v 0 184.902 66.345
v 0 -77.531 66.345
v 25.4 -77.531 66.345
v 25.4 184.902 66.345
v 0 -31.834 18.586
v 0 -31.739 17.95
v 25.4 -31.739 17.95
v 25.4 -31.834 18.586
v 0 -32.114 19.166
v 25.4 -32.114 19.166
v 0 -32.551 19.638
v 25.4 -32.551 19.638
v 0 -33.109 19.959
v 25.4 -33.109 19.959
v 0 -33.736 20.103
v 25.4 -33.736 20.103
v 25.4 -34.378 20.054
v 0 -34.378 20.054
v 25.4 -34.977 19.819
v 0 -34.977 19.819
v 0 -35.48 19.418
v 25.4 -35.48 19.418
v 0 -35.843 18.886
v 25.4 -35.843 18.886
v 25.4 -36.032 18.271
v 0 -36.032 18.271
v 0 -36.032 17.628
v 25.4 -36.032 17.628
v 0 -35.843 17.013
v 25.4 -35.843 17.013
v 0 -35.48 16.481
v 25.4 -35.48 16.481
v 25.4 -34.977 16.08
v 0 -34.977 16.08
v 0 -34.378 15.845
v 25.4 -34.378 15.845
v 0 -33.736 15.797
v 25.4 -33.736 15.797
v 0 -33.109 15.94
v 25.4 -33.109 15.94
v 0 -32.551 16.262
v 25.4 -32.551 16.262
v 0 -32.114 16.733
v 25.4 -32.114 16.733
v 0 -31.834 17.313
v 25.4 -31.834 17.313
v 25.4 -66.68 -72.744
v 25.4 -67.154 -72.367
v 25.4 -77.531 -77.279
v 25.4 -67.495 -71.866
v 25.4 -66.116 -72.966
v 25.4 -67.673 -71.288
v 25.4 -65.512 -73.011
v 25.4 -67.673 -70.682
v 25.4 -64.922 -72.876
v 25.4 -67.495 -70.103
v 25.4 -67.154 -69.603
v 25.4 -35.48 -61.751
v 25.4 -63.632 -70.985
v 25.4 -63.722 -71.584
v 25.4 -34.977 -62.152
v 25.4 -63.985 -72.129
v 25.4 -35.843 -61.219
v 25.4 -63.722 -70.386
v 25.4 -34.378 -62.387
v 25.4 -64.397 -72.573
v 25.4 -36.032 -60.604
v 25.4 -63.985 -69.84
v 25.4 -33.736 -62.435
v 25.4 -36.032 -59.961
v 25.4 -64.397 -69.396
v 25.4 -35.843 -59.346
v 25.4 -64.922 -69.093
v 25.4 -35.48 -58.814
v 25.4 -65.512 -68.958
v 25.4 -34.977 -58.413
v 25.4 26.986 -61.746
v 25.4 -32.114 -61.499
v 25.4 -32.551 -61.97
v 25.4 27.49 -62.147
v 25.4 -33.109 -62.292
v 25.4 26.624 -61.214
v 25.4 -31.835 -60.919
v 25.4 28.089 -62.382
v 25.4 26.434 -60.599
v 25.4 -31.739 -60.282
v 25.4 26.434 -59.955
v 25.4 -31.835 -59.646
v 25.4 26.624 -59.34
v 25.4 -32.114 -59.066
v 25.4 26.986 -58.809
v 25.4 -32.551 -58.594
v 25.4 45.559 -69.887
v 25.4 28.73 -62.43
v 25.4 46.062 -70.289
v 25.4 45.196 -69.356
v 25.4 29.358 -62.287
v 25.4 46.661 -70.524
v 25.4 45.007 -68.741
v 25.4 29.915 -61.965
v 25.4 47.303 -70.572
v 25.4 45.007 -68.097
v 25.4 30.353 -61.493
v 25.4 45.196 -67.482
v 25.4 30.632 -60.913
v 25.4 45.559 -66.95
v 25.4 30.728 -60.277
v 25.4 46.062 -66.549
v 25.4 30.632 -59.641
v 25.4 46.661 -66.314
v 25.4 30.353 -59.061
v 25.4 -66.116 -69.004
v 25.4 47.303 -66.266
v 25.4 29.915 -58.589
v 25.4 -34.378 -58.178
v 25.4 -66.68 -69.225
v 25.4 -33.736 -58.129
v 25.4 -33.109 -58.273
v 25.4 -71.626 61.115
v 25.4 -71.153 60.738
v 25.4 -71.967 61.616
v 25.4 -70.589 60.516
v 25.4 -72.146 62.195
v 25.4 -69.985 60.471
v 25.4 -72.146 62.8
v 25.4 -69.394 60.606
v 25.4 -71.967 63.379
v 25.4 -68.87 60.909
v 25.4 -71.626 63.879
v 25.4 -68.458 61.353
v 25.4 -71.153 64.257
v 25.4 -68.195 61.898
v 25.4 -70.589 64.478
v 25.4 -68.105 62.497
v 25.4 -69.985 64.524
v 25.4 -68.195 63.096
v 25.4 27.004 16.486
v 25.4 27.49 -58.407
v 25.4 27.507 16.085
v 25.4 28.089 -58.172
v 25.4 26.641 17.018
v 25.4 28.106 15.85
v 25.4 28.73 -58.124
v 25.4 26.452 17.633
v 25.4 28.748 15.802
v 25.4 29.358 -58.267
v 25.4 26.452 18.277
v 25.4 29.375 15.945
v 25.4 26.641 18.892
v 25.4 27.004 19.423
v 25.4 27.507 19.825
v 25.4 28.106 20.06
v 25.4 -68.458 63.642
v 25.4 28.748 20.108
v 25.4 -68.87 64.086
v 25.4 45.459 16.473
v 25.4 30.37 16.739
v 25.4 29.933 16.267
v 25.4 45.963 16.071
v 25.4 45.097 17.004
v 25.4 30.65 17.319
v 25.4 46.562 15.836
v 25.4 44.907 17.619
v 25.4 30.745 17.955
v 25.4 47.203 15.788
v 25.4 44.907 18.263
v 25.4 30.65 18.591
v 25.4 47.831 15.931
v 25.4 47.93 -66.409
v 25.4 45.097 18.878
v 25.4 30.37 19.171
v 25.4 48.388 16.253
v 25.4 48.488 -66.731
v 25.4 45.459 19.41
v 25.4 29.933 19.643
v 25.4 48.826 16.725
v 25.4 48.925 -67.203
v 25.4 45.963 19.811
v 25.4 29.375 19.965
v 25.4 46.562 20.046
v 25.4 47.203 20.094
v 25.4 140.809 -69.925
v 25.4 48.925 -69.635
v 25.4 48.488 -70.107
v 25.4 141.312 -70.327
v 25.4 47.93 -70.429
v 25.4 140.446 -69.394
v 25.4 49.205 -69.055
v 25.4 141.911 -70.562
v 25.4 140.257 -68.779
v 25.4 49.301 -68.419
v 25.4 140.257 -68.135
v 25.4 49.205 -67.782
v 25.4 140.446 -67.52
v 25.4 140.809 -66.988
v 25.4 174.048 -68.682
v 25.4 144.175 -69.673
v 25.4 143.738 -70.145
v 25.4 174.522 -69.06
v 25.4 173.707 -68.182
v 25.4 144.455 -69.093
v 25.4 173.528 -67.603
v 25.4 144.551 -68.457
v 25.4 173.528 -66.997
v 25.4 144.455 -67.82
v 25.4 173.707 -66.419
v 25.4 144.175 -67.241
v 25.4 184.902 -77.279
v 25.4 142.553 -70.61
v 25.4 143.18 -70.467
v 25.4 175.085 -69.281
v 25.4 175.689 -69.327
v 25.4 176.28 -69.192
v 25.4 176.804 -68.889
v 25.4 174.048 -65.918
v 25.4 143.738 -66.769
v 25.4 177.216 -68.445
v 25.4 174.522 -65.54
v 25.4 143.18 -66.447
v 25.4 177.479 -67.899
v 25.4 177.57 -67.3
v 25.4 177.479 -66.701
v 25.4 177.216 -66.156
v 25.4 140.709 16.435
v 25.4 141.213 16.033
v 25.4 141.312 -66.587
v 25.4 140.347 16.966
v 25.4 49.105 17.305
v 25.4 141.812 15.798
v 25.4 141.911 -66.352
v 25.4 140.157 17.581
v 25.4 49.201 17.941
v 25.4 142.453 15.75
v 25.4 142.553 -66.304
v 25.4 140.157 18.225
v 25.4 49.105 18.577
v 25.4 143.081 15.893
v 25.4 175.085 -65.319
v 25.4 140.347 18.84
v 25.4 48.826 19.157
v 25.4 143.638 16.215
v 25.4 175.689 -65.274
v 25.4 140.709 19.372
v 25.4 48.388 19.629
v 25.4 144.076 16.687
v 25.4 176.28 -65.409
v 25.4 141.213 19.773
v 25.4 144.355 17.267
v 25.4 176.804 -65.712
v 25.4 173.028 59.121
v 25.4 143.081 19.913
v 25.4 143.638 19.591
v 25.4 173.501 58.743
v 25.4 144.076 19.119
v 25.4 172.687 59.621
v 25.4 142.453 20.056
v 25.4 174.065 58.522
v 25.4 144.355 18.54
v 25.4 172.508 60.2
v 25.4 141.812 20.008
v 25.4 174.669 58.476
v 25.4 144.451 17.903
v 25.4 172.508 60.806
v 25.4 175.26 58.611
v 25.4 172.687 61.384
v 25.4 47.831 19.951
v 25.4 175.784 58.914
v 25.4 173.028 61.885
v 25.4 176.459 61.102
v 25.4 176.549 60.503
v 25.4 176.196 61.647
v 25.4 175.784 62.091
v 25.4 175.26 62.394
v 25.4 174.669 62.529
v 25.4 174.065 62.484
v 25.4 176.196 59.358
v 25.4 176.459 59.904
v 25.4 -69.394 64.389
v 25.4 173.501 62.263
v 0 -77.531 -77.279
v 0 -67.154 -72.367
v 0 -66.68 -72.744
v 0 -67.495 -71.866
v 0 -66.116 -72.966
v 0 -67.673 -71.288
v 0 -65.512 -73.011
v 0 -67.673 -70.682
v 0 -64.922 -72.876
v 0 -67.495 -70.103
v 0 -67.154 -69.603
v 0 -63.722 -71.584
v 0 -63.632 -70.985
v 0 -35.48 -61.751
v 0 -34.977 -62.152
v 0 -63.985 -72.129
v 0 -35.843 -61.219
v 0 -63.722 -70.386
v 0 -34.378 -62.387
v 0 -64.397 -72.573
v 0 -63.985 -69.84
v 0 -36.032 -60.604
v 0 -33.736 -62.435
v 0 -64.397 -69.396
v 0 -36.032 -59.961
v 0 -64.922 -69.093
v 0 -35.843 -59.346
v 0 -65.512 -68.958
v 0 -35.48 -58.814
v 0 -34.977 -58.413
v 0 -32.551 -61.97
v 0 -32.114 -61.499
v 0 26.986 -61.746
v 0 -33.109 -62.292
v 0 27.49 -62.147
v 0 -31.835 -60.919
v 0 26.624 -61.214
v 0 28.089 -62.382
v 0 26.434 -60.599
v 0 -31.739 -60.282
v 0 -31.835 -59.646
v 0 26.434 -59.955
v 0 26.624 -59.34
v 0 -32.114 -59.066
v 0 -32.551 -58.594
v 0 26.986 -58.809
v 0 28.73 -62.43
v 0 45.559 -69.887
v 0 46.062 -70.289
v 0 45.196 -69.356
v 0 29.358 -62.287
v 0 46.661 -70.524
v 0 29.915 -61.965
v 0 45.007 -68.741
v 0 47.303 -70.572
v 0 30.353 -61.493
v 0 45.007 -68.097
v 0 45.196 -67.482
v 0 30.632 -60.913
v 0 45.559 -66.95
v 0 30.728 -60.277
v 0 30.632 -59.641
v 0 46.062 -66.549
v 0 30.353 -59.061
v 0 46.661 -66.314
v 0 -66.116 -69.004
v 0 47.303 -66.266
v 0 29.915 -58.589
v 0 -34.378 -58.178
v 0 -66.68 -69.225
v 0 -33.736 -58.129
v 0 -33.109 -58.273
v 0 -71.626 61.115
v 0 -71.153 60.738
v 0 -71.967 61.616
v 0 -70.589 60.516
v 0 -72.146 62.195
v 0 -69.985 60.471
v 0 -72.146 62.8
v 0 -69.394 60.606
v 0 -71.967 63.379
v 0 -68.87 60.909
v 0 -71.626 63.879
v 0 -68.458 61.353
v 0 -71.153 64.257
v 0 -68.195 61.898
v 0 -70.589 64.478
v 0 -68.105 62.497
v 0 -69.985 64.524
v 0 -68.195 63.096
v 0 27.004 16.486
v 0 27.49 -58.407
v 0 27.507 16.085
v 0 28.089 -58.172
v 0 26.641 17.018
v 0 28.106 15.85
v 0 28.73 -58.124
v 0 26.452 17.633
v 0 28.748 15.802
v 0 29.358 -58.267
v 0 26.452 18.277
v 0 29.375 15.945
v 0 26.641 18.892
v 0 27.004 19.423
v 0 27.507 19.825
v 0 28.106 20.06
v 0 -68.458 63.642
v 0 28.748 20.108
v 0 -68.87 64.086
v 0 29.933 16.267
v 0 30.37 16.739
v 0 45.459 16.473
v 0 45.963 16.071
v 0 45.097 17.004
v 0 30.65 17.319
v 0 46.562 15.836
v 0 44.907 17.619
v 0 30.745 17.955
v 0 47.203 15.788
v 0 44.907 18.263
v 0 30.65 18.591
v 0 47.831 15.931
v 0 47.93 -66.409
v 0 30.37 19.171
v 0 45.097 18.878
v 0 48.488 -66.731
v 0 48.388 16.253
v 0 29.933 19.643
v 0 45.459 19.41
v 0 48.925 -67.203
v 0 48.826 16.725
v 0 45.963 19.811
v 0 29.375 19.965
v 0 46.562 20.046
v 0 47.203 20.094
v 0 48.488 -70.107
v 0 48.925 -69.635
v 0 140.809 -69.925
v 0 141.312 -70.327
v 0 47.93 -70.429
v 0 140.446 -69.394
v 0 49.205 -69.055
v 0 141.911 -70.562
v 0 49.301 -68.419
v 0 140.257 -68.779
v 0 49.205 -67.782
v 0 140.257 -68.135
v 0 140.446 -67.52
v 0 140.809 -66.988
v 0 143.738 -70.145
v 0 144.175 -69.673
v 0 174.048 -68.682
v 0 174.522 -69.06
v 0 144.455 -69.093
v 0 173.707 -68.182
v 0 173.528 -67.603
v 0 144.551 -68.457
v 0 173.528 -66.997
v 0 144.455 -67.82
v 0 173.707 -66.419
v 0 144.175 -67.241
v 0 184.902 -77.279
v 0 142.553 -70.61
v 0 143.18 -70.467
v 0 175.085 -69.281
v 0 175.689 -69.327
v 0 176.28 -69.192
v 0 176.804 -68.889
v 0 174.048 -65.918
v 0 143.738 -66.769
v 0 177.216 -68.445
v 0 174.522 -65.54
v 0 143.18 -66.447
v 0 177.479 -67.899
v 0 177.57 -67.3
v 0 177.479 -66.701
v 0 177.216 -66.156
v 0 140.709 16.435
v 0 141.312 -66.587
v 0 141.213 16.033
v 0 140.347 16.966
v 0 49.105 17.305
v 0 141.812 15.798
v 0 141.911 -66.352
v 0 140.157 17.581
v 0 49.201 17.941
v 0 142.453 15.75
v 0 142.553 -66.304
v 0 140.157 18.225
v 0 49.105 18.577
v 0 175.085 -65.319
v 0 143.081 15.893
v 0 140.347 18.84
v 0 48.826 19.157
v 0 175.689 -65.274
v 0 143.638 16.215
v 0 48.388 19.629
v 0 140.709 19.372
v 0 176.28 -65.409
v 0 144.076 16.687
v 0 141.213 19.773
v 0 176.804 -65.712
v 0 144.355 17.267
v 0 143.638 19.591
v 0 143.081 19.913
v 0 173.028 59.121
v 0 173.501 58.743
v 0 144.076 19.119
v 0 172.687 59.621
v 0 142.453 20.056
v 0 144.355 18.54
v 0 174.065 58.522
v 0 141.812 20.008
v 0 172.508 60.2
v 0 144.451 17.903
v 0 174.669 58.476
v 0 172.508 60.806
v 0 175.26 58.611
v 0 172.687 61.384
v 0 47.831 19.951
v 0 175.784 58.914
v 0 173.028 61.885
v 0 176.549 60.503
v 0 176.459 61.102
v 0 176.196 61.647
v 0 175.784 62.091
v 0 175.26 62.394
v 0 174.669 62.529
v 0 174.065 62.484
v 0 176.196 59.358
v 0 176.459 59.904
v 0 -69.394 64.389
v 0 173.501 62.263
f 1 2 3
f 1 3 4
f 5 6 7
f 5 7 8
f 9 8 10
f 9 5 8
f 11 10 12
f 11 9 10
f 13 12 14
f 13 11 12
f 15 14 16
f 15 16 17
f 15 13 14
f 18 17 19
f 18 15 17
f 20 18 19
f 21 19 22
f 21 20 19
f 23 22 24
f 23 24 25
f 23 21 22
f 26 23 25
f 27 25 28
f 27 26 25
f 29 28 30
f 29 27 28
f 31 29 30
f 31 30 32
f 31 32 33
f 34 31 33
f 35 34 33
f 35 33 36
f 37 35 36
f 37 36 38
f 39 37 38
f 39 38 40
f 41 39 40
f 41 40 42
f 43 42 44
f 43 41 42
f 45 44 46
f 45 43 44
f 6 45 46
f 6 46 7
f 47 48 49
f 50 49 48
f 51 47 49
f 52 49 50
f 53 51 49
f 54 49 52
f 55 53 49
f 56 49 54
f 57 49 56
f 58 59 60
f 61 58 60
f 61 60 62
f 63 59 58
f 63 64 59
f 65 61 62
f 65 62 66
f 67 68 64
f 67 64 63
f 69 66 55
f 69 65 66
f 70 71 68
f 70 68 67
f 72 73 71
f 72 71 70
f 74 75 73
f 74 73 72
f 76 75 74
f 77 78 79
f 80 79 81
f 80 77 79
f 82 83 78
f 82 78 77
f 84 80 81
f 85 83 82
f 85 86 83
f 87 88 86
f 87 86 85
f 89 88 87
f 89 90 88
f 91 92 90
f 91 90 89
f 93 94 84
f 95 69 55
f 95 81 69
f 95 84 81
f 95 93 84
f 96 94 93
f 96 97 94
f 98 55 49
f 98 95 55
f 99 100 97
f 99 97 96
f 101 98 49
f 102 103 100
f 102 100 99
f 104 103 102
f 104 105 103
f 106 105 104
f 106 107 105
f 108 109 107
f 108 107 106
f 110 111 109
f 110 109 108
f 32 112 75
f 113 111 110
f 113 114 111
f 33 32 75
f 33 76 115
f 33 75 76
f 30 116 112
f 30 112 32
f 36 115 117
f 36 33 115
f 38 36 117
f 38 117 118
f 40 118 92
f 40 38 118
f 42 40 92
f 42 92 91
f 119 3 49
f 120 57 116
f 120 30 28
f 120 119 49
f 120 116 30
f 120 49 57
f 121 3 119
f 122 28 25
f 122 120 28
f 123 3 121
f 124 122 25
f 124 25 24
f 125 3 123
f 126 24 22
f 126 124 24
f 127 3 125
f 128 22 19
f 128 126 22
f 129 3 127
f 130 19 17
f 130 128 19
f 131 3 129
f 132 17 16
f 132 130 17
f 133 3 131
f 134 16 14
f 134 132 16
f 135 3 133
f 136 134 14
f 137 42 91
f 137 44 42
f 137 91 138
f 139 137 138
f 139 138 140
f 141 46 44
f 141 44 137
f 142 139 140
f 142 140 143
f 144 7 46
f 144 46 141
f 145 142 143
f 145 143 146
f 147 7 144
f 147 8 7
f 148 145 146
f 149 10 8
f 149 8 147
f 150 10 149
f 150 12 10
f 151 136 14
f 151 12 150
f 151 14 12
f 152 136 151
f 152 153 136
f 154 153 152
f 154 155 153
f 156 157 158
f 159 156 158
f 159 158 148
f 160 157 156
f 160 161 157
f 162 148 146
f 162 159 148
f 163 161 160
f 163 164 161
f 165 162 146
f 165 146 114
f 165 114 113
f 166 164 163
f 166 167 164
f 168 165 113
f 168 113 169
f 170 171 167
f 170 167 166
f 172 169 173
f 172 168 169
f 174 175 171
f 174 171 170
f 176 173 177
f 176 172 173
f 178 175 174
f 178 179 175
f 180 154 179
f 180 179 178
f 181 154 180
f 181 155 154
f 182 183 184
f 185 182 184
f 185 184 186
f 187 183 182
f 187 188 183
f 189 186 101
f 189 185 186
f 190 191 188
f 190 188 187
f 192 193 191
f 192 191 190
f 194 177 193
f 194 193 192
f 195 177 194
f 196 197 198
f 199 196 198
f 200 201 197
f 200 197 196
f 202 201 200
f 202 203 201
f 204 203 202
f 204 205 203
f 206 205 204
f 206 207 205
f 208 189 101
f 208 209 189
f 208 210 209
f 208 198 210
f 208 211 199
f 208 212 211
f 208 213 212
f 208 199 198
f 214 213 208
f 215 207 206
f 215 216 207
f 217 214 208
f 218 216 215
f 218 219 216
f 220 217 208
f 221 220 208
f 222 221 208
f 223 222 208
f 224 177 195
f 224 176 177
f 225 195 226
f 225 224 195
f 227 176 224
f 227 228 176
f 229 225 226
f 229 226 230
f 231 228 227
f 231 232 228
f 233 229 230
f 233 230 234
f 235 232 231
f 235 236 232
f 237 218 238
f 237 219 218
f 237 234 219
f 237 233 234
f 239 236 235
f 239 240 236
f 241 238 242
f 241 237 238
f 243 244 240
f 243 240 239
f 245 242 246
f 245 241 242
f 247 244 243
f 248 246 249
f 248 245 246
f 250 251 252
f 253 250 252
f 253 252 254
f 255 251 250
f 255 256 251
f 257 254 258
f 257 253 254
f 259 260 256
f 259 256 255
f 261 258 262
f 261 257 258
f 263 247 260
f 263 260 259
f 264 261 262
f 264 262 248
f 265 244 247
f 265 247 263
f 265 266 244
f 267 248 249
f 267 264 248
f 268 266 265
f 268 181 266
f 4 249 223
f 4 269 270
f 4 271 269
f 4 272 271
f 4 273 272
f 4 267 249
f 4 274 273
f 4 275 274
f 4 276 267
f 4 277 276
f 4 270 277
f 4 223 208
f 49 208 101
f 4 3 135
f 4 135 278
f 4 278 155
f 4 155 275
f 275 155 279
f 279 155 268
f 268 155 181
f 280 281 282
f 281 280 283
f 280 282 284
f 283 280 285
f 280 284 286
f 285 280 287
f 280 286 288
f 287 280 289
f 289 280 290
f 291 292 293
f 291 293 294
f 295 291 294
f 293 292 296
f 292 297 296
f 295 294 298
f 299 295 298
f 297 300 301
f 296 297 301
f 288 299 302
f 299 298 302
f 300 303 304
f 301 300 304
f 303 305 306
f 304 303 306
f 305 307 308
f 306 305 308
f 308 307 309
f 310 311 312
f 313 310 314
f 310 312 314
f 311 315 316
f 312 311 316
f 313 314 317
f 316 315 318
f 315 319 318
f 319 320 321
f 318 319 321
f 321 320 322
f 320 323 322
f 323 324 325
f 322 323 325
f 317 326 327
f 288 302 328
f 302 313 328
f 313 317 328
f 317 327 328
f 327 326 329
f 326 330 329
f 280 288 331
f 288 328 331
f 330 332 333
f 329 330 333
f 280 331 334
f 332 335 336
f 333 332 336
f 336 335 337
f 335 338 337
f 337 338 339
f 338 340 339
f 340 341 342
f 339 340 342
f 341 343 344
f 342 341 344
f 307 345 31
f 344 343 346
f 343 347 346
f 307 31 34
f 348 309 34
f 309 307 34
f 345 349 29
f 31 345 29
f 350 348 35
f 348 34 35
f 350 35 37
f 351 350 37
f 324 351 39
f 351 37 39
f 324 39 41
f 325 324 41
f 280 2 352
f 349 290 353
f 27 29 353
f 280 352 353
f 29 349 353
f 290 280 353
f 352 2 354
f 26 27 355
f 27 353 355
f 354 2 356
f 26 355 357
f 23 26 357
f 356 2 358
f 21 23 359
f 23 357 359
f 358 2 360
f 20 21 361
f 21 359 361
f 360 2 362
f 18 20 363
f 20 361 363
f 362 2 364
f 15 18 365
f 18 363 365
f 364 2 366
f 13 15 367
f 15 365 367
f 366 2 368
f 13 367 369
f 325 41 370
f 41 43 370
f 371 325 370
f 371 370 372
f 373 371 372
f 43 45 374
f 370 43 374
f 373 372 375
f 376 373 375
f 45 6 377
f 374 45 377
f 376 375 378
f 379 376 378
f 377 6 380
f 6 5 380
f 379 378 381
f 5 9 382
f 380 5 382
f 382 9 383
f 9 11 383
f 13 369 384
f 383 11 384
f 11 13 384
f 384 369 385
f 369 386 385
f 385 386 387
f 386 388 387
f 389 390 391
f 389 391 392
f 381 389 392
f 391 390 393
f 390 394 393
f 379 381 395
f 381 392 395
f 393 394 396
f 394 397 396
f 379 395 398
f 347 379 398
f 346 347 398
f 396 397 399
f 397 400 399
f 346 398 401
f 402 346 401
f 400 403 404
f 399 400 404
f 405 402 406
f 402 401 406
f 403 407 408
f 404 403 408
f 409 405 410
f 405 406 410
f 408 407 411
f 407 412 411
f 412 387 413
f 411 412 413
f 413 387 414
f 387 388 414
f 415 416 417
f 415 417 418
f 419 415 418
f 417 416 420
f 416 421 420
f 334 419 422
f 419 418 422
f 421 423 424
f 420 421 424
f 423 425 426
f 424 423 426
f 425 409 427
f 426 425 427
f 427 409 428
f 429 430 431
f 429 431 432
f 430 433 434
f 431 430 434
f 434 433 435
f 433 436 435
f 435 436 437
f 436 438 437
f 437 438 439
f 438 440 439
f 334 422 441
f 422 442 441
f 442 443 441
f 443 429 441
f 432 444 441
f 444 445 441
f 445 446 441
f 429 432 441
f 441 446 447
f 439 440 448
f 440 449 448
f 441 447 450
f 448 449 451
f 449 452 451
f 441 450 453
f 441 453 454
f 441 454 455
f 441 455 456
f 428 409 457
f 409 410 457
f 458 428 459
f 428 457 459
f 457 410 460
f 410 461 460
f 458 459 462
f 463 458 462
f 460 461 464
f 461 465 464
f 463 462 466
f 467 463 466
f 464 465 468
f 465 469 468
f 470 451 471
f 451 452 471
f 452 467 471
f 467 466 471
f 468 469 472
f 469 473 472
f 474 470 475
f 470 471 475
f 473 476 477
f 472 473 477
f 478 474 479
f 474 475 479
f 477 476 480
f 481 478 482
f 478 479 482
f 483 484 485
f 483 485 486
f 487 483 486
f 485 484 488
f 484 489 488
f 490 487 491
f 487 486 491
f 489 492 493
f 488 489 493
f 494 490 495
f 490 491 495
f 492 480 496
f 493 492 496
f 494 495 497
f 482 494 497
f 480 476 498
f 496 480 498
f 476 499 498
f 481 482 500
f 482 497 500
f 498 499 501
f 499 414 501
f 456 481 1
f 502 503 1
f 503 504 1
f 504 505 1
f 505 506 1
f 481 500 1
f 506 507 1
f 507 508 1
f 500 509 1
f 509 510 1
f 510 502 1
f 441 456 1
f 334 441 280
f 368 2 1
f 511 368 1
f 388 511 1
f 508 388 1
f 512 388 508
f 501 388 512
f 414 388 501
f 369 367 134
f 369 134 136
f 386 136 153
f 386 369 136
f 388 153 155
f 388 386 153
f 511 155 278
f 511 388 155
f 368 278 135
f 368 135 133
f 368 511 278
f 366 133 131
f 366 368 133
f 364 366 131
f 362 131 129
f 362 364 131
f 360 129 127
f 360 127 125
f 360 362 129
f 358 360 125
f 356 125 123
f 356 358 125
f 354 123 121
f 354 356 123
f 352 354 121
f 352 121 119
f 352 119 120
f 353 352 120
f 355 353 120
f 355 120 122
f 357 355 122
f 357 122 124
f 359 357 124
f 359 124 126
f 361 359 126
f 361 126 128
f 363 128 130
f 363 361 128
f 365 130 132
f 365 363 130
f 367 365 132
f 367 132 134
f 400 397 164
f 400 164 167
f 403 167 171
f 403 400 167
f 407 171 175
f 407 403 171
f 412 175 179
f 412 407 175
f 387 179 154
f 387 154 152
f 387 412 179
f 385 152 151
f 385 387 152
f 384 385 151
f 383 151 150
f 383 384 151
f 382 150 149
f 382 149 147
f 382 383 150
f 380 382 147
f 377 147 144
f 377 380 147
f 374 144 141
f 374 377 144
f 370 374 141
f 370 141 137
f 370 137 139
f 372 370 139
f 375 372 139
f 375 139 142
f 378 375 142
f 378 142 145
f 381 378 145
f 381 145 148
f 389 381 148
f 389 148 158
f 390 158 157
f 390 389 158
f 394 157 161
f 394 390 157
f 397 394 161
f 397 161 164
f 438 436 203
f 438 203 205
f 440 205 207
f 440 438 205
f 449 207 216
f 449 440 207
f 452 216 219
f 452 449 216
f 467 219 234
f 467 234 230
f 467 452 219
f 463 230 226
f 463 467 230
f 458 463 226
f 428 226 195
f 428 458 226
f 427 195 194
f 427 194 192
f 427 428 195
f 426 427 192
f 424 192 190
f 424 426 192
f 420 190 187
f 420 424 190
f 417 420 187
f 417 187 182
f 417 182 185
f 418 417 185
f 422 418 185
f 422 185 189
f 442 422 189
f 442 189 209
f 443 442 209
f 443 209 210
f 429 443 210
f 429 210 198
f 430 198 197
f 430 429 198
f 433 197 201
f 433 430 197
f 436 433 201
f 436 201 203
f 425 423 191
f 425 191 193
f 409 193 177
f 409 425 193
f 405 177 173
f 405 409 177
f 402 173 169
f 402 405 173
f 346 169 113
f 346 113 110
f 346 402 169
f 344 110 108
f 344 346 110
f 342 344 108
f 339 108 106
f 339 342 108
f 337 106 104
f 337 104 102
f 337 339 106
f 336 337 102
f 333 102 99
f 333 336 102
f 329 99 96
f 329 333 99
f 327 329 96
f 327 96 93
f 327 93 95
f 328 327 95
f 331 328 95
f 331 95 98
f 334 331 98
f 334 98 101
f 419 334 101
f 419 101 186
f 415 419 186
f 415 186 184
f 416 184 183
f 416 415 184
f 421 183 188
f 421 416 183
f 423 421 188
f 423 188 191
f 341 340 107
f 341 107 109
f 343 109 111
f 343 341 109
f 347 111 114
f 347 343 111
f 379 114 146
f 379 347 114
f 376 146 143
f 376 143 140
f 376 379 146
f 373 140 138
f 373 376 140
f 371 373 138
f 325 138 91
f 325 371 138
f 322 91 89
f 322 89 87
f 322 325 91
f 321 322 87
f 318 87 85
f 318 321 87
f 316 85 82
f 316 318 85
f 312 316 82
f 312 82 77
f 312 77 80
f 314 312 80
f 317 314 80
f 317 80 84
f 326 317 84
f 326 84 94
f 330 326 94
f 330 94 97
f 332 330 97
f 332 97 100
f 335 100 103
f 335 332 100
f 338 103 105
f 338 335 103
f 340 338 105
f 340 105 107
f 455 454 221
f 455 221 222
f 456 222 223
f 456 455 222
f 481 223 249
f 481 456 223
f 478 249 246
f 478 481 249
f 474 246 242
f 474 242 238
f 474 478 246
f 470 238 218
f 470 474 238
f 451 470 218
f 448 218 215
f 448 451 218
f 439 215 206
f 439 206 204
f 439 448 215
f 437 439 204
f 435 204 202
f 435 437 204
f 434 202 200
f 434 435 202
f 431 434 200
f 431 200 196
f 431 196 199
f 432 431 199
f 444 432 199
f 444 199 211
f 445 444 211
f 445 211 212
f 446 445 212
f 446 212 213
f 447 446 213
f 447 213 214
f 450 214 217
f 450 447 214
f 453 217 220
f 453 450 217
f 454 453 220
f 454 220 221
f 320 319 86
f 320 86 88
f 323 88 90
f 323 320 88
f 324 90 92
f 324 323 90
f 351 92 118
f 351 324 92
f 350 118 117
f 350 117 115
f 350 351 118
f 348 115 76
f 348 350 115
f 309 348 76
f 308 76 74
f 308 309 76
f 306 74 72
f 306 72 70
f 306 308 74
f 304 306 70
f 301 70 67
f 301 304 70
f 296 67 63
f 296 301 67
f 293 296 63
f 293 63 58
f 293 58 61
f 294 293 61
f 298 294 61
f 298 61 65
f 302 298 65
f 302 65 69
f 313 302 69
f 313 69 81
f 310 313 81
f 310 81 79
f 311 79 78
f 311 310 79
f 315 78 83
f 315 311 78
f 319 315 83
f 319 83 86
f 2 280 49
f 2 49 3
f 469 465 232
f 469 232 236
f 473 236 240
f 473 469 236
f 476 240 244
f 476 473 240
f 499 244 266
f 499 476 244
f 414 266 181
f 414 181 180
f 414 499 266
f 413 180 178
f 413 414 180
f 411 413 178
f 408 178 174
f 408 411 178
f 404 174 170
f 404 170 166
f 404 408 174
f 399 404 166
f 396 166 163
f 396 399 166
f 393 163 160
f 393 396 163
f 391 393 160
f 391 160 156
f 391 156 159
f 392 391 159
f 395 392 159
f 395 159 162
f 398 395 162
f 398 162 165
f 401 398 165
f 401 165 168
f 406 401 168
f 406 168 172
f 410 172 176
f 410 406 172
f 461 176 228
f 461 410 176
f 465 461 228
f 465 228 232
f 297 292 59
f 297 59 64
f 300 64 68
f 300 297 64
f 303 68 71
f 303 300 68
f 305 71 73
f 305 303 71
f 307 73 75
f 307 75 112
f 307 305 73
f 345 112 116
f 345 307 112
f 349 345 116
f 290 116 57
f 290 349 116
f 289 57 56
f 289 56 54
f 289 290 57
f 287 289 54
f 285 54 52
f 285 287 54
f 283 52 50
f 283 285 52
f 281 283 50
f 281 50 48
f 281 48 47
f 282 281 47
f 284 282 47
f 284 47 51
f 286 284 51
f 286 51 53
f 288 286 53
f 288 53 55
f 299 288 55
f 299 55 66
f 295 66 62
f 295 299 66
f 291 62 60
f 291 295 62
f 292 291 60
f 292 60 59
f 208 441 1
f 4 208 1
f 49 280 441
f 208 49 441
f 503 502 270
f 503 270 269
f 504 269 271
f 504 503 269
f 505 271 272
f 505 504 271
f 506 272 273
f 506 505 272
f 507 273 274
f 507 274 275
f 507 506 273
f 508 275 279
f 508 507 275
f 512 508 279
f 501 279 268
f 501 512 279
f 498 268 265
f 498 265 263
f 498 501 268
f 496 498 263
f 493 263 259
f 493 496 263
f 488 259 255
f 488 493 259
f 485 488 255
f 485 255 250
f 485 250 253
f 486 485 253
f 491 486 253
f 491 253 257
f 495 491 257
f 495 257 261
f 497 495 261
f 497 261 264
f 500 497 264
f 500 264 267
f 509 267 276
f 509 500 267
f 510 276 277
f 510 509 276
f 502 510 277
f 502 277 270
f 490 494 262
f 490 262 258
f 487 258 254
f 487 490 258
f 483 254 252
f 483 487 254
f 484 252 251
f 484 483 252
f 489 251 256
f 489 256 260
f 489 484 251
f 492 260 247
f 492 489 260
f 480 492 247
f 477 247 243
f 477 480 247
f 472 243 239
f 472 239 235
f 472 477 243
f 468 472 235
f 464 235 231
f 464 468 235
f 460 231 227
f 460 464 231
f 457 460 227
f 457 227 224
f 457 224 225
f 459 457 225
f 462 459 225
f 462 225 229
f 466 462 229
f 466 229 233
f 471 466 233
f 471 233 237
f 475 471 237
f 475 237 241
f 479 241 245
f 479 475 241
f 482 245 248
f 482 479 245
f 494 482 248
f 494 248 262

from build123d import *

# Parameters (mm, degrees)
F0_W     = 262.433231
F0_H     = 143.624164
F0_R     = 2.032
F0_R_2   = 2.159
F1_DEPTH = 25.4


with BuildPart() as f1:
    # F0 (on Right) → F1 (new body)
    with BuildSketch(Plane.YZ):
        with Locations((53.685457, -5.467344)):
            Rectangle(F0_W, F0_H)
        with Locations((-65.664113, -70.984699)):
            Circle(F0_R, mode=Mode.SUBTRACT)
        with Locations((-33.897583, -60.282462)):
            Circle(F0_R_2, mode=Mode.SUBTRACT)
        with Locations((47.141639, -68.418872)):
            Circle(F0_R_2, mode=Mode.SUBTRACT)
        with Locations((28.569087, -60.277043)):
            Circle(F0_R_2, mode=Mode.SUBTRACT)
        with Locations((142.391632, -68.456784)):
            Circle(F0_R_2, mode=Mode.SUBTRACT)
        with Locations((175.537544, -67.300248)):
            Circle(F0_R, mode=Mode.SUBTRACT)
        with Locations((-33.897511, 17.949538)):
            Circle(F0_R_2, mode=Mode.SUBTRACT)
        with Locations((28.586489, 17.954956)):
            Circle(F0_R_2, mode=Mode.SUBTRACT)
        with Locations((47.042011, 17.94107)):
            Circle(F0_R_2, mode=Mode.SUBTRACT)
        with Locations((-70.136527, 62.497376)):
            Circle(F0_R, mode=Mode.SUBTRACT)
        with Locations((142.292004, 17.903158)):
            Circle(F0_R_2, mode=Mode.SUBTRACT)
        with Locations((174.517364, 60.502738)):
            Circle(F0_R, mode=Mode.SUBTRACT)
    extrude(amount=F1_DEPTH)


solid = f1.part
